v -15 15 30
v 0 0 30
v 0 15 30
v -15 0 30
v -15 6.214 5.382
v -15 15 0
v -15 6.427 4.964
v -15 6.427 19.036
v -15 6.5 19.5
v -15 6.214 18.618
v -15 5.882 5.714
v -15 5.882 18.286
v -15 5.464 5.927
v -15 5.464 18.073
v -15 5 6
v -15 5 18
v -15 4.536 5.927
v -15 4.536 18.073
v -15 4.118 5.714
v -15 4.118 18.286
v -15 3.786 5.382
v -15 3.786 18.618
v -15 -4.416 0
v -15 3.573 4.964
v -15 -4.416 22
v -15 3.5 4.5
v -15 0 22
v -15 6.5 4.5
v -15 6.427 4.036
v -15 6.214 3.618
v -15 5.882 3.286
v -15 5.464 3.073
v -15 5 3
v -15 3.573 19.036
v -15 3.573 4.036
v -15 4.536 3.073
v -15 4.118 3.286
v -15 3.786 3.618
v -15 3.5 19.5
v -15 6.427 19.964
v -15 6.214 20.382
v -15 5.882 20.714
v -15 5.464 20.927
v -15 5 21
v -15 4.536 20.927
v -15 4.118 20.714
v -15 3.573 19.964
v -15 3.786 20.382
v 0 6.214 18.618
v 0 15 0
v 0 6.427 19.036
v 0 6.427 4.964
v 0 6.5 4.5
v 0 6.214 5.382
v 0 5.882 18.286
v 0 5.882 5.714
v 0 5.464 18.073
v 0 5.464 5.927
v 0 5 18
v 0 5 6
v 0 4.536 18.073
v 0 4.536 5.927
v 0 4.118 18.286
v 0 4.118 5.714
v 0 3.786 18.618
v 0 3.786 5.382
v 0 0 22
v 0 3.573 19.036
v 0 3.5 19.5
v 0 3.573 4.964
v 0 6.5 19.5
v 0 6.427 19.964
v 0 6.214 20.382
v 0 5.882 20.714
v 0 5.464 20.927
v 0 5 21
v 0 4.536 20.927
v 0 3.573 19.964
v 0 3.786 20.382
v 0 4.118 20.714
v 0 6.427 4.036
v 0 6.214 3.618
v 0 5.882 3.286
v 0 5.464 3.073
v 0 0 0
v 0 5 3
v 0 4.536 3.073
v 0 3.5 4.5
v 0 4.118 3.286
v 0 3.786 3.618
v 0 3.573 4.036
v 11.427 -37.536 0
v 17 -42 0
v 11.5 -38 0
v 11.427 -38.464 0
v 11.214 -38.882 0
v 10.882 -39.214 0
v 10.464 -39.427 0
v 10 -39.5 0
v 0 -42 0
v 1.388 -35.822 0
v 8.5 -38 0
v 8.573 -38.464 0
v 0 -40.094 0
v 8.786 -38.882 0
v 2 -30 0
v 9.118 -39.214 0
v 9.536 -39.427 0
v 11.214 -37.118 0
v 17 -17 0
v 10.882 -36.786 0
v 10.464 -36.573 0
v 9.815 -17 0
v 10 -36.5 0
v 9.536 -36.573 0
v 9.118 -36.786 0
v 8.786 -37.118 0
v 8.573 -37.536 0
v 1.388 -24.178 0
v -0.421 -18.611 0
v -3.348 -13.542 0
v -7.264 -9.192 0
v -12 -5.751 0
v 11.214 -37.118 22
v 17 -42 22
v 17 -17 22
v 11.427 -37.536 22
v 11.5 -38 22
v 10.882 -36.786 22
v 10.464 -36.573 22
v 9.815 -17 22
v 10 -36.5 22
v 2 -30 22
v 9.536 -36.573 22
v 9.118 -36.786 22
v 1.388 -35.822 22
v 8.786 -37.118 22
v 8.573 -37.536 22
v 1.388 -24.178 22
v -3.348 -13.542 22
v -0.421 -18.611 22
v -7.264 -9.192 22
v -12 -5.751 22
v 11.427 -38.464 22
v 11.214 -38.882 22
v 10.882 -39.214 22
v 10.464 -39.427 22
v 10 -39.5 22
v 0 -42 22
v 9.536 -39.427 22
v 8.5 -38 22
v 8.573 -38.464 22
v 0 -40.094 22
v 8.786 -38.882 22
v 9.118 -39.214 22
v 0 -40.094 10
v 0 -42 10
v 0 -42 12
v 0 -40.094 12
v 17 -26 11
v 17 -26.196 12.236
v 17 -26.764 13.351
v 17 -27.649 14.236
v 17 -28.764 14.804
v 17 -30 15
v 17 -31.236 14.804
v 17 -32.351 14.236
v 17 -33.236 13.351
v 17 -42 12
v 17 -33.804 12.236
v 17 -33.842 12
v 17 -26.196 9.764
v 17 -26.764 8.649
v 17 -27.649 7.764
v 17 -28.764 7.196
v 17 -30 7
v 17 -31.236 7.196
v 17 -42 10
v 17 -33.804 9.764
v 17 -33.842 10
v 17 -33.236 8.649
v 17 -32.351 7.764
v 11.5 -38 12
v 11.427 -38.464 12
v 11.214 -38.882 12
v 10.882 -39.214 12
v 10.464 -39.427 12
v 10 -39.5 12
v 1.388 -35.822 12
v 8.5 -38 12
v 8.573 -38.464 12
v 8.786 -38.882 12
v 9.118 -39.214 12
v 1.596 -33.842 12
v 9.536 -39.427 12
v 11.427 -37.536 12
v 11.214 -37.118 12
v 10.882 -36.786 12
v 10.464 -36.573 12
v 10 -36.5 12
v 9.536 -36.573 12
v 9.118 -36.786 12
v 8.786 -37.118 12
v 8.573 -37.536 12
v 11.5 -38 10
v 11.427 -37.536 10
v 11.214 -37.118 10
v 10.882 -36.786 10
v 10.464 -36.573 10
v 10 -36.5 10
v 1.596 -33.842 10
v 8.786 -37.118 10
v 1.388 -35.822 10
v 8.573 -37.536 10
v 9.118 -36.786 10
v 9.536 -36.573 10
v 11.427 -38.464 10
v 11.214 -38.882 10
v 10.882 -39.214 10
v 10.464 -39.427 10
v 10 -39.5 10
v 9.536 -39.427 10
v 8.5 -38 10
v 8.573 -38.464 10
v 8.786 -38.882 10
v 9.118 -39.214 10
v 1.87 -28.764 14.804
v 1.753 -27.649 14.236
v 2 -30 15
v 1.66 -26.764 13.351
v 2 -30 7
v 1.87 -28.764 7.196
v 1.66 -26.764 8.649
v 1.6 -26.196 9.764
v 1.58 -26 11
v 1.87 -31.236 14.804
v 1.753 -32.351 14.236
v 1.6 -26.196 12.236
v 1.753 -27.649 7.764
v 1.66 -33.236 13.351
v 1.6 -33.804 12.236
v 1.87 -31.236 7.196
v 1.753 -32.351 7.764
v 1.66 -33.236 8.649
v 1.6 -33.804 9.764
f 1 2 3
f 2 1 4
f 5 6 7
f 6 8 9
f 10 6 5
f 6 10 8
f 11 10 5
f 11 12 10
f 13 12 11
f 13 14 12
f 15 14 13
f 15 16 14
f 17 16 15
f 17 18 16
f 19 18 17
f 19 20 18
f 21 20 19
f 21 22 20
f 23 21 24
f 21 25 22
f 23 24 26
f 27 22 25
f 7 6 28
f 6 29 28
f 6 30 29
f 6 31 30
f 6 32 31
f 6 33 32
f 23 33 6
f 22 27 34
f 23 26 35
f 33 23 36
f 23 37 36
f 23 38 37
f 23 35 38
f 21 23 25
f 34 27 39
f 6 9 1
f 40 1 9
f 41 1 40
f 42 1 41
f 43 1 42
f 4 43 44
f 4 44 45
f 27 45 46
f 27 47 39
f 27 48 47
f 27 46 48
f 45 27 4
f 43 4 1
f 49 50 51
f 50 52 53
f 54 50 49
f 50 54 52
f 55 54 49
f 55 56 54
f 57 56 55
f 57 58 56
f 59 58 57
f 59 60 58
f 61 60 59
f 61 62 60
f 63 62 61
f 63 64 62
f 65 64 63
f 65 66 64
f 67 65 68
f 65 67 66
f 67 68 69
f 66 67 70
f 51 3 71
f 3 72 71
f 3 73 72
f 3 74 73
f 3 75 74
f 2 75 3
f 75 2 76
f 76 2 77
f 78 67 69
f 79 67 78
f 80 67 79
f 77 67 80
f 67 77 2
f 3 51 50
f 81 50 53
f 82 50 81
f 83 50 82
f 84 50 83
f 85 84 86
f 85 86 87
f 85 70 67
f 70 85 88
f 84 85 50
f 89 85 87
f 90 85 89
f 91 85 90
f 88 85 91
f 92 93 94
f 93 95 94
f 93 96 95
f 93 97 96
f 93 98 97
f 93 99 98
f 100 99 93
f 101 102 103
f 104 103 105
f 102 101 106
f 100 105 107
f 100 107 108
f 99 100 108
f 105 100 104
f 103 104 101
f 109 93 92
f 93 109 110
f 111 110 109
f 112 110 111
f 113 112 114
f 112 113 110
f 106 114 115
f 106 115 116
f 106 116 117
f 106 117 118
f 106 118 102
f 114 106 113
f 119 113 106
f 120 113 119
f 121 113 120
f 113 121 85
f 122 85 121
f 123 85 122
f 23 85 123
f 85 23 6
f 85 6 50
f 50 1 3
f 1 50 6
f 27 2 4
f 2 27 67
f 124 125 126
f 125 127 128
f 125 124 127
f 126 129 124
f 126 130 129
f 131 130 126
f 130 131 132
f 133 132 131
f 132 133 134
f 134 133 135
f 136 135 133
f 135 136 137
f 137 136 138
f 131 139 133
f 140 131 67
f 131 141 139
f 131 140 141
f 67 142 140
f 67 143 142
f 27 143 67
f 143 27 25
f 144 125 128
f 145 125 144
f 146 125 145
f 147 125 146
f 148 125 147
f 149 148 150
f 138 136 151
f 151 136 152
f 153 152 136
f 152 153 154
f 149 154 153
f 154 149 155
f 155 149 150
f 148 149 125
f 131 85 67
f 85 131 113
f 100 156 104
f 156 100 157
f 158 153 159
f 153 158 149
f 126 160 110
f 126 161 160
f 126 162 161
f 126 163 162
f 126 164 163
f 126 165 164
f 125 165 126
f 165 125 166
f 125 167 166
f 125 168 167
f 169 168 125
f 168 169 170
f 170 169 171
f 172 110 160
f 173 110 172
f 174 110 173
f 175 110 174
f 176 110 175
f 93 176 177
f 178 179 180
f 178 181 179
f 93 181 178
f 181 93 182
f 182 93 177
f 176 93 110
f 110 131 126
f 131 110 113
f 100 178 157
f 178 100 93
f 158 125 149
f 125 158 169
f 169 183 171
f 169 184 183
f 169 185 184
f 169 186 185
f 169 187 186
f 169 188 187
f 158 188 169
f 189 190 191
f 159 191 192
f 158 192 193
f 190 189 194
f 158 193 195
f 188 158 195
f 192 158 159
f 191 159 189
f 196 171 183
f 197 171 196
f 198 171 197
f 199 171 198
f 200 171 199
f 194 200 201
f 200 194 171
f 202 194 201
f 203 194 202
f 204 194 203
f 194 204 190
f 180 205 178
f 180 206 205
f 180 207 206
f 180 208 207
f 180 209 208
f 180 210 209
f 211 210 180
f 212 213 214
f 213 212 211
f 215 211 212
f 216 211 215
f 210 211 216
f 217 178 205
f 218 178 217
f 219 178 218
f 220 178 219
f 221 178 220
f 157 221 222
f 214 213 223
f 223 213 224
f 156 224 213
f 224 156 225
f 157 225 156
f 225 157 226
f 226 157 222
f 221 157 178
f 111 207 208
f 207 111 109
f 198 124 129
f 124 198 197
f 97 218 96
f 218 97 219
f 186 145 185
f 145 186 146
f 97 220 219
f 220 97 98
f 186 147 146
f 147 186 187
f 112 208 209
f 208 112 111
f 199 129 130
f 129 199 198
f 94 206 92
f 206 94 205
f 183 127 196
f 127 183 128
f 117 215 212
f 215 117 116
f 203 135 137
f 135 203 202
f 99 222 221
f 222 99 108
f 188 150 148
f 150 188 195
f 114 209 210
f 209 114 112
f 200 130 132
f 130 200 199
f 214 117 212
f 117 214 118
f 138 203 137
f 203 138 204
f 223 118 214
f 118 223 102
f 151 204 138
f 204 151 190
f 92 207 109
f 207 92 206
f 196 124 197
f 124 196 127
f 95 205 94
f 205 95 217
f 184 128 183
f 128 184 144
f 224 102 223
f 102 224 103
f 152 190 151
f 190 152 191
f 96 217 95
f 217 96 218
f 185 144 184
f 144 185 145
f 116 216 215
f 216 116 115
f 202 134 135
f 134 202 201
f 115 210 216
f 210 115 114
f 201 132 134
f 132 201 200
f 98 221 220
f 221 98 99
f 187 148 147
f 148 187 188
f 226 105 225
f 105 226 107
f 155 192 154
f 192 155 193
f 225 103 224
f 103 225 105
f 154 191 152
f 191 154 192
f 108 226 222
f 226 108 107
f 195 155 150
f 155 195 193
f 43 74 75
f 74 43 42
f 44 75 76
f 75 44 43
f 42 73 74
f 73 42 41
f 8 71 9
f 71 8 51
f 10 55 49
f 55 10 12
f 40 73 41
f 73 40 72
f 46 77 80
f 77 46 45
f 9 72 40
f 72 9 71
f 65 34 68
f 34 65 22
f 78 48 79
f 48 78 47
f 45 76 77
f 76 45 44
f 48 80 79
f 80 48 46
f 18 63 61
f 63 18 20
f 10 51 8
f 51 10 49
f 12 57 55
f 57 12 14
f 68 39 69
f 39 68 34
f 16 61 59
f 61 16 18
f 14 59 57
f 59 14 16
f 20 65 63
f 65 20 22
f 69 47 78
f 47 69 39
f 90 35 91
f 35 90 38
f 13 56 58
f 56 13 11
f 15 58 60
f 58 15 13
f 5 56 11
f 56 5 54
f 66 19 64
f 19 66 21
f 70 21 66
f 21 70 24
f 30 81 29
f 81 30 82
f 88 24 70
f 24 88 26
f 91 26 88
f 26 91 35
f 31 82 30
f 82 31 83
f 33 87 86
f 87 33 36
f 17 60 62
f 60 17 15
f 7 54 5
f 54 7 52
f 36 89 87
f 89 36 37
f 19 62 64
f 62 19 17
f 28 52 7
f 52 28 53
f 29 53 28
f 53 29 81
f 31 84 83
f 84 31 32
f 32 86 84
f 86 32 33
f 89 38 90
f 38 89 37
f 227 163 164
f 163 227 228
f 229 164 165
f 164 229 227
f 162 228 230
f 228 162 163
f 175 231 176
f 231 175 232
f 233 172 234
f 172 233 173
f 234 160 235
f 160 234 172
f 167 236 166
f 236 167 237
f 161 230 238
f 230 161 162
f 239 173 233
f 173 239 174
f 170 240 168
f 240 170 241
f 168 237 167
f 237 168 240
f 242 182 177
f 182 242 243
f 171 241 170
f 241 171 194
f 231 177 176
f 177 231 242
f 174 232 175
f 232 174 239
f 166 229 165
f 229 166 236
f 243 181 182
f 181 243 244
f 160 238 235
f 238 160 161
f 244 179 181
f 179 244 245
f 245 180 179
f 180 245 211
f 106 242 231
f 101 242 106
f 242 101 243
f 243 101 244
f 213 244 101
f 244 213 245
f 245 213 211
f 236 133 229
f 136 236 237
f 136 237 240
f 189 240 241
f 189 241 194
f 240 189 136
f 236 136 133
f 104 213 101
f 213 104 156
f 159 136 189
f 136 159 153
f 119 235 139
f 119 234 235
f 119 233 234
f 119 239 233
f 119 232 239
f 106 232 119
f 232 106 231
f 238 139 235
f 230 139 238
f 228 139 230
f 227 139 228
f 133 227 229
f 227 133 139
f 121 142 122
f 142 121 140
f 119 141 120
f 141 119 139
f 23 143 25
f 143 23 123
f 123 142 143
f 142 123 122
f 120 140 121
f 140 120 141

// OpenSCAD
// [FL_INDEX: keywords="openscad, 3d_parametric, RepRapPro_Mendel_Lugless_Dial_Indicator_Holder, csg_solid" | COT="Parametric OpenSCAD design from 3DCodeverse"]
// Title: RepRapPro Mendel Lugless Dial Indicator Holder

//Upright or Sideways (whichever you feel works best with your support needs/capabilities)
Orientation="Sideways";//[Upright,Sideways]

//Clamp (Requires support)
Clamp="True";//[True,False]

//Units
Units=1;//[1:mm,25.4:inches]

//Diameter of the stem where inserted into the holder
Stem_Diameter=8;

//Diameter of the dial bezel
Bezel_Diameter=56;

Stem_Radius = Stem_Diameter * Units * 0.5;
Bezel_Radius = Bezel_Diameter * Units * 0.5;

module block(){
	union(){
		translate([-12,0,0])
		cube([30,15,15]);

		translate([-12,-17,0])
		cube([22,18,15]);

		rotate(30,[1,0,0])
		translate([-12,-20,0])
		cube([22,20,15]);

		translate([-12,-42,-17])
		cube([22,25,17]);
	}
}

module mill(){
	translate([7.5,5,-2])
	cylinder(r=1.5,h=25,$fn=20);
	translate([-7.5,5,-2])
	cylinder(r=1.5,h=25,$fn=20);

	translate([-1,-30,-20])
	cylinder(r=Stem_Radius,h=40,$fn=20);

	rotate(90,[0,1,0])
	translate([30-(2*Bezel_Radius),-30,0])
	cylinder(r=Bezel_Radius,h=25, center=true,$fn=30);

	if(Clamp=="True"){
		translate([-2,-54,-20])
		cube([2,25,25]);
		rotate(90,[0,1,0])
		translate([10,-38,-20])
		cylinder(r=1.5,h=40,$fn=20);
	}else{
		rotate(90,[0,1,0])
		translate([10,-30,-20])
		cylinder(r=1.5,h=40,$fn=20);
	}	
}

module dialholder(){
	difference(){
		block();
		mill();
	}
}

if(Orientation=="Sideways"){
	rotate(-90,[0,1,0])
	translate([12,0,0])
	dialholder();
}else{
	translate([0,0,17])
	dialholder();
}
